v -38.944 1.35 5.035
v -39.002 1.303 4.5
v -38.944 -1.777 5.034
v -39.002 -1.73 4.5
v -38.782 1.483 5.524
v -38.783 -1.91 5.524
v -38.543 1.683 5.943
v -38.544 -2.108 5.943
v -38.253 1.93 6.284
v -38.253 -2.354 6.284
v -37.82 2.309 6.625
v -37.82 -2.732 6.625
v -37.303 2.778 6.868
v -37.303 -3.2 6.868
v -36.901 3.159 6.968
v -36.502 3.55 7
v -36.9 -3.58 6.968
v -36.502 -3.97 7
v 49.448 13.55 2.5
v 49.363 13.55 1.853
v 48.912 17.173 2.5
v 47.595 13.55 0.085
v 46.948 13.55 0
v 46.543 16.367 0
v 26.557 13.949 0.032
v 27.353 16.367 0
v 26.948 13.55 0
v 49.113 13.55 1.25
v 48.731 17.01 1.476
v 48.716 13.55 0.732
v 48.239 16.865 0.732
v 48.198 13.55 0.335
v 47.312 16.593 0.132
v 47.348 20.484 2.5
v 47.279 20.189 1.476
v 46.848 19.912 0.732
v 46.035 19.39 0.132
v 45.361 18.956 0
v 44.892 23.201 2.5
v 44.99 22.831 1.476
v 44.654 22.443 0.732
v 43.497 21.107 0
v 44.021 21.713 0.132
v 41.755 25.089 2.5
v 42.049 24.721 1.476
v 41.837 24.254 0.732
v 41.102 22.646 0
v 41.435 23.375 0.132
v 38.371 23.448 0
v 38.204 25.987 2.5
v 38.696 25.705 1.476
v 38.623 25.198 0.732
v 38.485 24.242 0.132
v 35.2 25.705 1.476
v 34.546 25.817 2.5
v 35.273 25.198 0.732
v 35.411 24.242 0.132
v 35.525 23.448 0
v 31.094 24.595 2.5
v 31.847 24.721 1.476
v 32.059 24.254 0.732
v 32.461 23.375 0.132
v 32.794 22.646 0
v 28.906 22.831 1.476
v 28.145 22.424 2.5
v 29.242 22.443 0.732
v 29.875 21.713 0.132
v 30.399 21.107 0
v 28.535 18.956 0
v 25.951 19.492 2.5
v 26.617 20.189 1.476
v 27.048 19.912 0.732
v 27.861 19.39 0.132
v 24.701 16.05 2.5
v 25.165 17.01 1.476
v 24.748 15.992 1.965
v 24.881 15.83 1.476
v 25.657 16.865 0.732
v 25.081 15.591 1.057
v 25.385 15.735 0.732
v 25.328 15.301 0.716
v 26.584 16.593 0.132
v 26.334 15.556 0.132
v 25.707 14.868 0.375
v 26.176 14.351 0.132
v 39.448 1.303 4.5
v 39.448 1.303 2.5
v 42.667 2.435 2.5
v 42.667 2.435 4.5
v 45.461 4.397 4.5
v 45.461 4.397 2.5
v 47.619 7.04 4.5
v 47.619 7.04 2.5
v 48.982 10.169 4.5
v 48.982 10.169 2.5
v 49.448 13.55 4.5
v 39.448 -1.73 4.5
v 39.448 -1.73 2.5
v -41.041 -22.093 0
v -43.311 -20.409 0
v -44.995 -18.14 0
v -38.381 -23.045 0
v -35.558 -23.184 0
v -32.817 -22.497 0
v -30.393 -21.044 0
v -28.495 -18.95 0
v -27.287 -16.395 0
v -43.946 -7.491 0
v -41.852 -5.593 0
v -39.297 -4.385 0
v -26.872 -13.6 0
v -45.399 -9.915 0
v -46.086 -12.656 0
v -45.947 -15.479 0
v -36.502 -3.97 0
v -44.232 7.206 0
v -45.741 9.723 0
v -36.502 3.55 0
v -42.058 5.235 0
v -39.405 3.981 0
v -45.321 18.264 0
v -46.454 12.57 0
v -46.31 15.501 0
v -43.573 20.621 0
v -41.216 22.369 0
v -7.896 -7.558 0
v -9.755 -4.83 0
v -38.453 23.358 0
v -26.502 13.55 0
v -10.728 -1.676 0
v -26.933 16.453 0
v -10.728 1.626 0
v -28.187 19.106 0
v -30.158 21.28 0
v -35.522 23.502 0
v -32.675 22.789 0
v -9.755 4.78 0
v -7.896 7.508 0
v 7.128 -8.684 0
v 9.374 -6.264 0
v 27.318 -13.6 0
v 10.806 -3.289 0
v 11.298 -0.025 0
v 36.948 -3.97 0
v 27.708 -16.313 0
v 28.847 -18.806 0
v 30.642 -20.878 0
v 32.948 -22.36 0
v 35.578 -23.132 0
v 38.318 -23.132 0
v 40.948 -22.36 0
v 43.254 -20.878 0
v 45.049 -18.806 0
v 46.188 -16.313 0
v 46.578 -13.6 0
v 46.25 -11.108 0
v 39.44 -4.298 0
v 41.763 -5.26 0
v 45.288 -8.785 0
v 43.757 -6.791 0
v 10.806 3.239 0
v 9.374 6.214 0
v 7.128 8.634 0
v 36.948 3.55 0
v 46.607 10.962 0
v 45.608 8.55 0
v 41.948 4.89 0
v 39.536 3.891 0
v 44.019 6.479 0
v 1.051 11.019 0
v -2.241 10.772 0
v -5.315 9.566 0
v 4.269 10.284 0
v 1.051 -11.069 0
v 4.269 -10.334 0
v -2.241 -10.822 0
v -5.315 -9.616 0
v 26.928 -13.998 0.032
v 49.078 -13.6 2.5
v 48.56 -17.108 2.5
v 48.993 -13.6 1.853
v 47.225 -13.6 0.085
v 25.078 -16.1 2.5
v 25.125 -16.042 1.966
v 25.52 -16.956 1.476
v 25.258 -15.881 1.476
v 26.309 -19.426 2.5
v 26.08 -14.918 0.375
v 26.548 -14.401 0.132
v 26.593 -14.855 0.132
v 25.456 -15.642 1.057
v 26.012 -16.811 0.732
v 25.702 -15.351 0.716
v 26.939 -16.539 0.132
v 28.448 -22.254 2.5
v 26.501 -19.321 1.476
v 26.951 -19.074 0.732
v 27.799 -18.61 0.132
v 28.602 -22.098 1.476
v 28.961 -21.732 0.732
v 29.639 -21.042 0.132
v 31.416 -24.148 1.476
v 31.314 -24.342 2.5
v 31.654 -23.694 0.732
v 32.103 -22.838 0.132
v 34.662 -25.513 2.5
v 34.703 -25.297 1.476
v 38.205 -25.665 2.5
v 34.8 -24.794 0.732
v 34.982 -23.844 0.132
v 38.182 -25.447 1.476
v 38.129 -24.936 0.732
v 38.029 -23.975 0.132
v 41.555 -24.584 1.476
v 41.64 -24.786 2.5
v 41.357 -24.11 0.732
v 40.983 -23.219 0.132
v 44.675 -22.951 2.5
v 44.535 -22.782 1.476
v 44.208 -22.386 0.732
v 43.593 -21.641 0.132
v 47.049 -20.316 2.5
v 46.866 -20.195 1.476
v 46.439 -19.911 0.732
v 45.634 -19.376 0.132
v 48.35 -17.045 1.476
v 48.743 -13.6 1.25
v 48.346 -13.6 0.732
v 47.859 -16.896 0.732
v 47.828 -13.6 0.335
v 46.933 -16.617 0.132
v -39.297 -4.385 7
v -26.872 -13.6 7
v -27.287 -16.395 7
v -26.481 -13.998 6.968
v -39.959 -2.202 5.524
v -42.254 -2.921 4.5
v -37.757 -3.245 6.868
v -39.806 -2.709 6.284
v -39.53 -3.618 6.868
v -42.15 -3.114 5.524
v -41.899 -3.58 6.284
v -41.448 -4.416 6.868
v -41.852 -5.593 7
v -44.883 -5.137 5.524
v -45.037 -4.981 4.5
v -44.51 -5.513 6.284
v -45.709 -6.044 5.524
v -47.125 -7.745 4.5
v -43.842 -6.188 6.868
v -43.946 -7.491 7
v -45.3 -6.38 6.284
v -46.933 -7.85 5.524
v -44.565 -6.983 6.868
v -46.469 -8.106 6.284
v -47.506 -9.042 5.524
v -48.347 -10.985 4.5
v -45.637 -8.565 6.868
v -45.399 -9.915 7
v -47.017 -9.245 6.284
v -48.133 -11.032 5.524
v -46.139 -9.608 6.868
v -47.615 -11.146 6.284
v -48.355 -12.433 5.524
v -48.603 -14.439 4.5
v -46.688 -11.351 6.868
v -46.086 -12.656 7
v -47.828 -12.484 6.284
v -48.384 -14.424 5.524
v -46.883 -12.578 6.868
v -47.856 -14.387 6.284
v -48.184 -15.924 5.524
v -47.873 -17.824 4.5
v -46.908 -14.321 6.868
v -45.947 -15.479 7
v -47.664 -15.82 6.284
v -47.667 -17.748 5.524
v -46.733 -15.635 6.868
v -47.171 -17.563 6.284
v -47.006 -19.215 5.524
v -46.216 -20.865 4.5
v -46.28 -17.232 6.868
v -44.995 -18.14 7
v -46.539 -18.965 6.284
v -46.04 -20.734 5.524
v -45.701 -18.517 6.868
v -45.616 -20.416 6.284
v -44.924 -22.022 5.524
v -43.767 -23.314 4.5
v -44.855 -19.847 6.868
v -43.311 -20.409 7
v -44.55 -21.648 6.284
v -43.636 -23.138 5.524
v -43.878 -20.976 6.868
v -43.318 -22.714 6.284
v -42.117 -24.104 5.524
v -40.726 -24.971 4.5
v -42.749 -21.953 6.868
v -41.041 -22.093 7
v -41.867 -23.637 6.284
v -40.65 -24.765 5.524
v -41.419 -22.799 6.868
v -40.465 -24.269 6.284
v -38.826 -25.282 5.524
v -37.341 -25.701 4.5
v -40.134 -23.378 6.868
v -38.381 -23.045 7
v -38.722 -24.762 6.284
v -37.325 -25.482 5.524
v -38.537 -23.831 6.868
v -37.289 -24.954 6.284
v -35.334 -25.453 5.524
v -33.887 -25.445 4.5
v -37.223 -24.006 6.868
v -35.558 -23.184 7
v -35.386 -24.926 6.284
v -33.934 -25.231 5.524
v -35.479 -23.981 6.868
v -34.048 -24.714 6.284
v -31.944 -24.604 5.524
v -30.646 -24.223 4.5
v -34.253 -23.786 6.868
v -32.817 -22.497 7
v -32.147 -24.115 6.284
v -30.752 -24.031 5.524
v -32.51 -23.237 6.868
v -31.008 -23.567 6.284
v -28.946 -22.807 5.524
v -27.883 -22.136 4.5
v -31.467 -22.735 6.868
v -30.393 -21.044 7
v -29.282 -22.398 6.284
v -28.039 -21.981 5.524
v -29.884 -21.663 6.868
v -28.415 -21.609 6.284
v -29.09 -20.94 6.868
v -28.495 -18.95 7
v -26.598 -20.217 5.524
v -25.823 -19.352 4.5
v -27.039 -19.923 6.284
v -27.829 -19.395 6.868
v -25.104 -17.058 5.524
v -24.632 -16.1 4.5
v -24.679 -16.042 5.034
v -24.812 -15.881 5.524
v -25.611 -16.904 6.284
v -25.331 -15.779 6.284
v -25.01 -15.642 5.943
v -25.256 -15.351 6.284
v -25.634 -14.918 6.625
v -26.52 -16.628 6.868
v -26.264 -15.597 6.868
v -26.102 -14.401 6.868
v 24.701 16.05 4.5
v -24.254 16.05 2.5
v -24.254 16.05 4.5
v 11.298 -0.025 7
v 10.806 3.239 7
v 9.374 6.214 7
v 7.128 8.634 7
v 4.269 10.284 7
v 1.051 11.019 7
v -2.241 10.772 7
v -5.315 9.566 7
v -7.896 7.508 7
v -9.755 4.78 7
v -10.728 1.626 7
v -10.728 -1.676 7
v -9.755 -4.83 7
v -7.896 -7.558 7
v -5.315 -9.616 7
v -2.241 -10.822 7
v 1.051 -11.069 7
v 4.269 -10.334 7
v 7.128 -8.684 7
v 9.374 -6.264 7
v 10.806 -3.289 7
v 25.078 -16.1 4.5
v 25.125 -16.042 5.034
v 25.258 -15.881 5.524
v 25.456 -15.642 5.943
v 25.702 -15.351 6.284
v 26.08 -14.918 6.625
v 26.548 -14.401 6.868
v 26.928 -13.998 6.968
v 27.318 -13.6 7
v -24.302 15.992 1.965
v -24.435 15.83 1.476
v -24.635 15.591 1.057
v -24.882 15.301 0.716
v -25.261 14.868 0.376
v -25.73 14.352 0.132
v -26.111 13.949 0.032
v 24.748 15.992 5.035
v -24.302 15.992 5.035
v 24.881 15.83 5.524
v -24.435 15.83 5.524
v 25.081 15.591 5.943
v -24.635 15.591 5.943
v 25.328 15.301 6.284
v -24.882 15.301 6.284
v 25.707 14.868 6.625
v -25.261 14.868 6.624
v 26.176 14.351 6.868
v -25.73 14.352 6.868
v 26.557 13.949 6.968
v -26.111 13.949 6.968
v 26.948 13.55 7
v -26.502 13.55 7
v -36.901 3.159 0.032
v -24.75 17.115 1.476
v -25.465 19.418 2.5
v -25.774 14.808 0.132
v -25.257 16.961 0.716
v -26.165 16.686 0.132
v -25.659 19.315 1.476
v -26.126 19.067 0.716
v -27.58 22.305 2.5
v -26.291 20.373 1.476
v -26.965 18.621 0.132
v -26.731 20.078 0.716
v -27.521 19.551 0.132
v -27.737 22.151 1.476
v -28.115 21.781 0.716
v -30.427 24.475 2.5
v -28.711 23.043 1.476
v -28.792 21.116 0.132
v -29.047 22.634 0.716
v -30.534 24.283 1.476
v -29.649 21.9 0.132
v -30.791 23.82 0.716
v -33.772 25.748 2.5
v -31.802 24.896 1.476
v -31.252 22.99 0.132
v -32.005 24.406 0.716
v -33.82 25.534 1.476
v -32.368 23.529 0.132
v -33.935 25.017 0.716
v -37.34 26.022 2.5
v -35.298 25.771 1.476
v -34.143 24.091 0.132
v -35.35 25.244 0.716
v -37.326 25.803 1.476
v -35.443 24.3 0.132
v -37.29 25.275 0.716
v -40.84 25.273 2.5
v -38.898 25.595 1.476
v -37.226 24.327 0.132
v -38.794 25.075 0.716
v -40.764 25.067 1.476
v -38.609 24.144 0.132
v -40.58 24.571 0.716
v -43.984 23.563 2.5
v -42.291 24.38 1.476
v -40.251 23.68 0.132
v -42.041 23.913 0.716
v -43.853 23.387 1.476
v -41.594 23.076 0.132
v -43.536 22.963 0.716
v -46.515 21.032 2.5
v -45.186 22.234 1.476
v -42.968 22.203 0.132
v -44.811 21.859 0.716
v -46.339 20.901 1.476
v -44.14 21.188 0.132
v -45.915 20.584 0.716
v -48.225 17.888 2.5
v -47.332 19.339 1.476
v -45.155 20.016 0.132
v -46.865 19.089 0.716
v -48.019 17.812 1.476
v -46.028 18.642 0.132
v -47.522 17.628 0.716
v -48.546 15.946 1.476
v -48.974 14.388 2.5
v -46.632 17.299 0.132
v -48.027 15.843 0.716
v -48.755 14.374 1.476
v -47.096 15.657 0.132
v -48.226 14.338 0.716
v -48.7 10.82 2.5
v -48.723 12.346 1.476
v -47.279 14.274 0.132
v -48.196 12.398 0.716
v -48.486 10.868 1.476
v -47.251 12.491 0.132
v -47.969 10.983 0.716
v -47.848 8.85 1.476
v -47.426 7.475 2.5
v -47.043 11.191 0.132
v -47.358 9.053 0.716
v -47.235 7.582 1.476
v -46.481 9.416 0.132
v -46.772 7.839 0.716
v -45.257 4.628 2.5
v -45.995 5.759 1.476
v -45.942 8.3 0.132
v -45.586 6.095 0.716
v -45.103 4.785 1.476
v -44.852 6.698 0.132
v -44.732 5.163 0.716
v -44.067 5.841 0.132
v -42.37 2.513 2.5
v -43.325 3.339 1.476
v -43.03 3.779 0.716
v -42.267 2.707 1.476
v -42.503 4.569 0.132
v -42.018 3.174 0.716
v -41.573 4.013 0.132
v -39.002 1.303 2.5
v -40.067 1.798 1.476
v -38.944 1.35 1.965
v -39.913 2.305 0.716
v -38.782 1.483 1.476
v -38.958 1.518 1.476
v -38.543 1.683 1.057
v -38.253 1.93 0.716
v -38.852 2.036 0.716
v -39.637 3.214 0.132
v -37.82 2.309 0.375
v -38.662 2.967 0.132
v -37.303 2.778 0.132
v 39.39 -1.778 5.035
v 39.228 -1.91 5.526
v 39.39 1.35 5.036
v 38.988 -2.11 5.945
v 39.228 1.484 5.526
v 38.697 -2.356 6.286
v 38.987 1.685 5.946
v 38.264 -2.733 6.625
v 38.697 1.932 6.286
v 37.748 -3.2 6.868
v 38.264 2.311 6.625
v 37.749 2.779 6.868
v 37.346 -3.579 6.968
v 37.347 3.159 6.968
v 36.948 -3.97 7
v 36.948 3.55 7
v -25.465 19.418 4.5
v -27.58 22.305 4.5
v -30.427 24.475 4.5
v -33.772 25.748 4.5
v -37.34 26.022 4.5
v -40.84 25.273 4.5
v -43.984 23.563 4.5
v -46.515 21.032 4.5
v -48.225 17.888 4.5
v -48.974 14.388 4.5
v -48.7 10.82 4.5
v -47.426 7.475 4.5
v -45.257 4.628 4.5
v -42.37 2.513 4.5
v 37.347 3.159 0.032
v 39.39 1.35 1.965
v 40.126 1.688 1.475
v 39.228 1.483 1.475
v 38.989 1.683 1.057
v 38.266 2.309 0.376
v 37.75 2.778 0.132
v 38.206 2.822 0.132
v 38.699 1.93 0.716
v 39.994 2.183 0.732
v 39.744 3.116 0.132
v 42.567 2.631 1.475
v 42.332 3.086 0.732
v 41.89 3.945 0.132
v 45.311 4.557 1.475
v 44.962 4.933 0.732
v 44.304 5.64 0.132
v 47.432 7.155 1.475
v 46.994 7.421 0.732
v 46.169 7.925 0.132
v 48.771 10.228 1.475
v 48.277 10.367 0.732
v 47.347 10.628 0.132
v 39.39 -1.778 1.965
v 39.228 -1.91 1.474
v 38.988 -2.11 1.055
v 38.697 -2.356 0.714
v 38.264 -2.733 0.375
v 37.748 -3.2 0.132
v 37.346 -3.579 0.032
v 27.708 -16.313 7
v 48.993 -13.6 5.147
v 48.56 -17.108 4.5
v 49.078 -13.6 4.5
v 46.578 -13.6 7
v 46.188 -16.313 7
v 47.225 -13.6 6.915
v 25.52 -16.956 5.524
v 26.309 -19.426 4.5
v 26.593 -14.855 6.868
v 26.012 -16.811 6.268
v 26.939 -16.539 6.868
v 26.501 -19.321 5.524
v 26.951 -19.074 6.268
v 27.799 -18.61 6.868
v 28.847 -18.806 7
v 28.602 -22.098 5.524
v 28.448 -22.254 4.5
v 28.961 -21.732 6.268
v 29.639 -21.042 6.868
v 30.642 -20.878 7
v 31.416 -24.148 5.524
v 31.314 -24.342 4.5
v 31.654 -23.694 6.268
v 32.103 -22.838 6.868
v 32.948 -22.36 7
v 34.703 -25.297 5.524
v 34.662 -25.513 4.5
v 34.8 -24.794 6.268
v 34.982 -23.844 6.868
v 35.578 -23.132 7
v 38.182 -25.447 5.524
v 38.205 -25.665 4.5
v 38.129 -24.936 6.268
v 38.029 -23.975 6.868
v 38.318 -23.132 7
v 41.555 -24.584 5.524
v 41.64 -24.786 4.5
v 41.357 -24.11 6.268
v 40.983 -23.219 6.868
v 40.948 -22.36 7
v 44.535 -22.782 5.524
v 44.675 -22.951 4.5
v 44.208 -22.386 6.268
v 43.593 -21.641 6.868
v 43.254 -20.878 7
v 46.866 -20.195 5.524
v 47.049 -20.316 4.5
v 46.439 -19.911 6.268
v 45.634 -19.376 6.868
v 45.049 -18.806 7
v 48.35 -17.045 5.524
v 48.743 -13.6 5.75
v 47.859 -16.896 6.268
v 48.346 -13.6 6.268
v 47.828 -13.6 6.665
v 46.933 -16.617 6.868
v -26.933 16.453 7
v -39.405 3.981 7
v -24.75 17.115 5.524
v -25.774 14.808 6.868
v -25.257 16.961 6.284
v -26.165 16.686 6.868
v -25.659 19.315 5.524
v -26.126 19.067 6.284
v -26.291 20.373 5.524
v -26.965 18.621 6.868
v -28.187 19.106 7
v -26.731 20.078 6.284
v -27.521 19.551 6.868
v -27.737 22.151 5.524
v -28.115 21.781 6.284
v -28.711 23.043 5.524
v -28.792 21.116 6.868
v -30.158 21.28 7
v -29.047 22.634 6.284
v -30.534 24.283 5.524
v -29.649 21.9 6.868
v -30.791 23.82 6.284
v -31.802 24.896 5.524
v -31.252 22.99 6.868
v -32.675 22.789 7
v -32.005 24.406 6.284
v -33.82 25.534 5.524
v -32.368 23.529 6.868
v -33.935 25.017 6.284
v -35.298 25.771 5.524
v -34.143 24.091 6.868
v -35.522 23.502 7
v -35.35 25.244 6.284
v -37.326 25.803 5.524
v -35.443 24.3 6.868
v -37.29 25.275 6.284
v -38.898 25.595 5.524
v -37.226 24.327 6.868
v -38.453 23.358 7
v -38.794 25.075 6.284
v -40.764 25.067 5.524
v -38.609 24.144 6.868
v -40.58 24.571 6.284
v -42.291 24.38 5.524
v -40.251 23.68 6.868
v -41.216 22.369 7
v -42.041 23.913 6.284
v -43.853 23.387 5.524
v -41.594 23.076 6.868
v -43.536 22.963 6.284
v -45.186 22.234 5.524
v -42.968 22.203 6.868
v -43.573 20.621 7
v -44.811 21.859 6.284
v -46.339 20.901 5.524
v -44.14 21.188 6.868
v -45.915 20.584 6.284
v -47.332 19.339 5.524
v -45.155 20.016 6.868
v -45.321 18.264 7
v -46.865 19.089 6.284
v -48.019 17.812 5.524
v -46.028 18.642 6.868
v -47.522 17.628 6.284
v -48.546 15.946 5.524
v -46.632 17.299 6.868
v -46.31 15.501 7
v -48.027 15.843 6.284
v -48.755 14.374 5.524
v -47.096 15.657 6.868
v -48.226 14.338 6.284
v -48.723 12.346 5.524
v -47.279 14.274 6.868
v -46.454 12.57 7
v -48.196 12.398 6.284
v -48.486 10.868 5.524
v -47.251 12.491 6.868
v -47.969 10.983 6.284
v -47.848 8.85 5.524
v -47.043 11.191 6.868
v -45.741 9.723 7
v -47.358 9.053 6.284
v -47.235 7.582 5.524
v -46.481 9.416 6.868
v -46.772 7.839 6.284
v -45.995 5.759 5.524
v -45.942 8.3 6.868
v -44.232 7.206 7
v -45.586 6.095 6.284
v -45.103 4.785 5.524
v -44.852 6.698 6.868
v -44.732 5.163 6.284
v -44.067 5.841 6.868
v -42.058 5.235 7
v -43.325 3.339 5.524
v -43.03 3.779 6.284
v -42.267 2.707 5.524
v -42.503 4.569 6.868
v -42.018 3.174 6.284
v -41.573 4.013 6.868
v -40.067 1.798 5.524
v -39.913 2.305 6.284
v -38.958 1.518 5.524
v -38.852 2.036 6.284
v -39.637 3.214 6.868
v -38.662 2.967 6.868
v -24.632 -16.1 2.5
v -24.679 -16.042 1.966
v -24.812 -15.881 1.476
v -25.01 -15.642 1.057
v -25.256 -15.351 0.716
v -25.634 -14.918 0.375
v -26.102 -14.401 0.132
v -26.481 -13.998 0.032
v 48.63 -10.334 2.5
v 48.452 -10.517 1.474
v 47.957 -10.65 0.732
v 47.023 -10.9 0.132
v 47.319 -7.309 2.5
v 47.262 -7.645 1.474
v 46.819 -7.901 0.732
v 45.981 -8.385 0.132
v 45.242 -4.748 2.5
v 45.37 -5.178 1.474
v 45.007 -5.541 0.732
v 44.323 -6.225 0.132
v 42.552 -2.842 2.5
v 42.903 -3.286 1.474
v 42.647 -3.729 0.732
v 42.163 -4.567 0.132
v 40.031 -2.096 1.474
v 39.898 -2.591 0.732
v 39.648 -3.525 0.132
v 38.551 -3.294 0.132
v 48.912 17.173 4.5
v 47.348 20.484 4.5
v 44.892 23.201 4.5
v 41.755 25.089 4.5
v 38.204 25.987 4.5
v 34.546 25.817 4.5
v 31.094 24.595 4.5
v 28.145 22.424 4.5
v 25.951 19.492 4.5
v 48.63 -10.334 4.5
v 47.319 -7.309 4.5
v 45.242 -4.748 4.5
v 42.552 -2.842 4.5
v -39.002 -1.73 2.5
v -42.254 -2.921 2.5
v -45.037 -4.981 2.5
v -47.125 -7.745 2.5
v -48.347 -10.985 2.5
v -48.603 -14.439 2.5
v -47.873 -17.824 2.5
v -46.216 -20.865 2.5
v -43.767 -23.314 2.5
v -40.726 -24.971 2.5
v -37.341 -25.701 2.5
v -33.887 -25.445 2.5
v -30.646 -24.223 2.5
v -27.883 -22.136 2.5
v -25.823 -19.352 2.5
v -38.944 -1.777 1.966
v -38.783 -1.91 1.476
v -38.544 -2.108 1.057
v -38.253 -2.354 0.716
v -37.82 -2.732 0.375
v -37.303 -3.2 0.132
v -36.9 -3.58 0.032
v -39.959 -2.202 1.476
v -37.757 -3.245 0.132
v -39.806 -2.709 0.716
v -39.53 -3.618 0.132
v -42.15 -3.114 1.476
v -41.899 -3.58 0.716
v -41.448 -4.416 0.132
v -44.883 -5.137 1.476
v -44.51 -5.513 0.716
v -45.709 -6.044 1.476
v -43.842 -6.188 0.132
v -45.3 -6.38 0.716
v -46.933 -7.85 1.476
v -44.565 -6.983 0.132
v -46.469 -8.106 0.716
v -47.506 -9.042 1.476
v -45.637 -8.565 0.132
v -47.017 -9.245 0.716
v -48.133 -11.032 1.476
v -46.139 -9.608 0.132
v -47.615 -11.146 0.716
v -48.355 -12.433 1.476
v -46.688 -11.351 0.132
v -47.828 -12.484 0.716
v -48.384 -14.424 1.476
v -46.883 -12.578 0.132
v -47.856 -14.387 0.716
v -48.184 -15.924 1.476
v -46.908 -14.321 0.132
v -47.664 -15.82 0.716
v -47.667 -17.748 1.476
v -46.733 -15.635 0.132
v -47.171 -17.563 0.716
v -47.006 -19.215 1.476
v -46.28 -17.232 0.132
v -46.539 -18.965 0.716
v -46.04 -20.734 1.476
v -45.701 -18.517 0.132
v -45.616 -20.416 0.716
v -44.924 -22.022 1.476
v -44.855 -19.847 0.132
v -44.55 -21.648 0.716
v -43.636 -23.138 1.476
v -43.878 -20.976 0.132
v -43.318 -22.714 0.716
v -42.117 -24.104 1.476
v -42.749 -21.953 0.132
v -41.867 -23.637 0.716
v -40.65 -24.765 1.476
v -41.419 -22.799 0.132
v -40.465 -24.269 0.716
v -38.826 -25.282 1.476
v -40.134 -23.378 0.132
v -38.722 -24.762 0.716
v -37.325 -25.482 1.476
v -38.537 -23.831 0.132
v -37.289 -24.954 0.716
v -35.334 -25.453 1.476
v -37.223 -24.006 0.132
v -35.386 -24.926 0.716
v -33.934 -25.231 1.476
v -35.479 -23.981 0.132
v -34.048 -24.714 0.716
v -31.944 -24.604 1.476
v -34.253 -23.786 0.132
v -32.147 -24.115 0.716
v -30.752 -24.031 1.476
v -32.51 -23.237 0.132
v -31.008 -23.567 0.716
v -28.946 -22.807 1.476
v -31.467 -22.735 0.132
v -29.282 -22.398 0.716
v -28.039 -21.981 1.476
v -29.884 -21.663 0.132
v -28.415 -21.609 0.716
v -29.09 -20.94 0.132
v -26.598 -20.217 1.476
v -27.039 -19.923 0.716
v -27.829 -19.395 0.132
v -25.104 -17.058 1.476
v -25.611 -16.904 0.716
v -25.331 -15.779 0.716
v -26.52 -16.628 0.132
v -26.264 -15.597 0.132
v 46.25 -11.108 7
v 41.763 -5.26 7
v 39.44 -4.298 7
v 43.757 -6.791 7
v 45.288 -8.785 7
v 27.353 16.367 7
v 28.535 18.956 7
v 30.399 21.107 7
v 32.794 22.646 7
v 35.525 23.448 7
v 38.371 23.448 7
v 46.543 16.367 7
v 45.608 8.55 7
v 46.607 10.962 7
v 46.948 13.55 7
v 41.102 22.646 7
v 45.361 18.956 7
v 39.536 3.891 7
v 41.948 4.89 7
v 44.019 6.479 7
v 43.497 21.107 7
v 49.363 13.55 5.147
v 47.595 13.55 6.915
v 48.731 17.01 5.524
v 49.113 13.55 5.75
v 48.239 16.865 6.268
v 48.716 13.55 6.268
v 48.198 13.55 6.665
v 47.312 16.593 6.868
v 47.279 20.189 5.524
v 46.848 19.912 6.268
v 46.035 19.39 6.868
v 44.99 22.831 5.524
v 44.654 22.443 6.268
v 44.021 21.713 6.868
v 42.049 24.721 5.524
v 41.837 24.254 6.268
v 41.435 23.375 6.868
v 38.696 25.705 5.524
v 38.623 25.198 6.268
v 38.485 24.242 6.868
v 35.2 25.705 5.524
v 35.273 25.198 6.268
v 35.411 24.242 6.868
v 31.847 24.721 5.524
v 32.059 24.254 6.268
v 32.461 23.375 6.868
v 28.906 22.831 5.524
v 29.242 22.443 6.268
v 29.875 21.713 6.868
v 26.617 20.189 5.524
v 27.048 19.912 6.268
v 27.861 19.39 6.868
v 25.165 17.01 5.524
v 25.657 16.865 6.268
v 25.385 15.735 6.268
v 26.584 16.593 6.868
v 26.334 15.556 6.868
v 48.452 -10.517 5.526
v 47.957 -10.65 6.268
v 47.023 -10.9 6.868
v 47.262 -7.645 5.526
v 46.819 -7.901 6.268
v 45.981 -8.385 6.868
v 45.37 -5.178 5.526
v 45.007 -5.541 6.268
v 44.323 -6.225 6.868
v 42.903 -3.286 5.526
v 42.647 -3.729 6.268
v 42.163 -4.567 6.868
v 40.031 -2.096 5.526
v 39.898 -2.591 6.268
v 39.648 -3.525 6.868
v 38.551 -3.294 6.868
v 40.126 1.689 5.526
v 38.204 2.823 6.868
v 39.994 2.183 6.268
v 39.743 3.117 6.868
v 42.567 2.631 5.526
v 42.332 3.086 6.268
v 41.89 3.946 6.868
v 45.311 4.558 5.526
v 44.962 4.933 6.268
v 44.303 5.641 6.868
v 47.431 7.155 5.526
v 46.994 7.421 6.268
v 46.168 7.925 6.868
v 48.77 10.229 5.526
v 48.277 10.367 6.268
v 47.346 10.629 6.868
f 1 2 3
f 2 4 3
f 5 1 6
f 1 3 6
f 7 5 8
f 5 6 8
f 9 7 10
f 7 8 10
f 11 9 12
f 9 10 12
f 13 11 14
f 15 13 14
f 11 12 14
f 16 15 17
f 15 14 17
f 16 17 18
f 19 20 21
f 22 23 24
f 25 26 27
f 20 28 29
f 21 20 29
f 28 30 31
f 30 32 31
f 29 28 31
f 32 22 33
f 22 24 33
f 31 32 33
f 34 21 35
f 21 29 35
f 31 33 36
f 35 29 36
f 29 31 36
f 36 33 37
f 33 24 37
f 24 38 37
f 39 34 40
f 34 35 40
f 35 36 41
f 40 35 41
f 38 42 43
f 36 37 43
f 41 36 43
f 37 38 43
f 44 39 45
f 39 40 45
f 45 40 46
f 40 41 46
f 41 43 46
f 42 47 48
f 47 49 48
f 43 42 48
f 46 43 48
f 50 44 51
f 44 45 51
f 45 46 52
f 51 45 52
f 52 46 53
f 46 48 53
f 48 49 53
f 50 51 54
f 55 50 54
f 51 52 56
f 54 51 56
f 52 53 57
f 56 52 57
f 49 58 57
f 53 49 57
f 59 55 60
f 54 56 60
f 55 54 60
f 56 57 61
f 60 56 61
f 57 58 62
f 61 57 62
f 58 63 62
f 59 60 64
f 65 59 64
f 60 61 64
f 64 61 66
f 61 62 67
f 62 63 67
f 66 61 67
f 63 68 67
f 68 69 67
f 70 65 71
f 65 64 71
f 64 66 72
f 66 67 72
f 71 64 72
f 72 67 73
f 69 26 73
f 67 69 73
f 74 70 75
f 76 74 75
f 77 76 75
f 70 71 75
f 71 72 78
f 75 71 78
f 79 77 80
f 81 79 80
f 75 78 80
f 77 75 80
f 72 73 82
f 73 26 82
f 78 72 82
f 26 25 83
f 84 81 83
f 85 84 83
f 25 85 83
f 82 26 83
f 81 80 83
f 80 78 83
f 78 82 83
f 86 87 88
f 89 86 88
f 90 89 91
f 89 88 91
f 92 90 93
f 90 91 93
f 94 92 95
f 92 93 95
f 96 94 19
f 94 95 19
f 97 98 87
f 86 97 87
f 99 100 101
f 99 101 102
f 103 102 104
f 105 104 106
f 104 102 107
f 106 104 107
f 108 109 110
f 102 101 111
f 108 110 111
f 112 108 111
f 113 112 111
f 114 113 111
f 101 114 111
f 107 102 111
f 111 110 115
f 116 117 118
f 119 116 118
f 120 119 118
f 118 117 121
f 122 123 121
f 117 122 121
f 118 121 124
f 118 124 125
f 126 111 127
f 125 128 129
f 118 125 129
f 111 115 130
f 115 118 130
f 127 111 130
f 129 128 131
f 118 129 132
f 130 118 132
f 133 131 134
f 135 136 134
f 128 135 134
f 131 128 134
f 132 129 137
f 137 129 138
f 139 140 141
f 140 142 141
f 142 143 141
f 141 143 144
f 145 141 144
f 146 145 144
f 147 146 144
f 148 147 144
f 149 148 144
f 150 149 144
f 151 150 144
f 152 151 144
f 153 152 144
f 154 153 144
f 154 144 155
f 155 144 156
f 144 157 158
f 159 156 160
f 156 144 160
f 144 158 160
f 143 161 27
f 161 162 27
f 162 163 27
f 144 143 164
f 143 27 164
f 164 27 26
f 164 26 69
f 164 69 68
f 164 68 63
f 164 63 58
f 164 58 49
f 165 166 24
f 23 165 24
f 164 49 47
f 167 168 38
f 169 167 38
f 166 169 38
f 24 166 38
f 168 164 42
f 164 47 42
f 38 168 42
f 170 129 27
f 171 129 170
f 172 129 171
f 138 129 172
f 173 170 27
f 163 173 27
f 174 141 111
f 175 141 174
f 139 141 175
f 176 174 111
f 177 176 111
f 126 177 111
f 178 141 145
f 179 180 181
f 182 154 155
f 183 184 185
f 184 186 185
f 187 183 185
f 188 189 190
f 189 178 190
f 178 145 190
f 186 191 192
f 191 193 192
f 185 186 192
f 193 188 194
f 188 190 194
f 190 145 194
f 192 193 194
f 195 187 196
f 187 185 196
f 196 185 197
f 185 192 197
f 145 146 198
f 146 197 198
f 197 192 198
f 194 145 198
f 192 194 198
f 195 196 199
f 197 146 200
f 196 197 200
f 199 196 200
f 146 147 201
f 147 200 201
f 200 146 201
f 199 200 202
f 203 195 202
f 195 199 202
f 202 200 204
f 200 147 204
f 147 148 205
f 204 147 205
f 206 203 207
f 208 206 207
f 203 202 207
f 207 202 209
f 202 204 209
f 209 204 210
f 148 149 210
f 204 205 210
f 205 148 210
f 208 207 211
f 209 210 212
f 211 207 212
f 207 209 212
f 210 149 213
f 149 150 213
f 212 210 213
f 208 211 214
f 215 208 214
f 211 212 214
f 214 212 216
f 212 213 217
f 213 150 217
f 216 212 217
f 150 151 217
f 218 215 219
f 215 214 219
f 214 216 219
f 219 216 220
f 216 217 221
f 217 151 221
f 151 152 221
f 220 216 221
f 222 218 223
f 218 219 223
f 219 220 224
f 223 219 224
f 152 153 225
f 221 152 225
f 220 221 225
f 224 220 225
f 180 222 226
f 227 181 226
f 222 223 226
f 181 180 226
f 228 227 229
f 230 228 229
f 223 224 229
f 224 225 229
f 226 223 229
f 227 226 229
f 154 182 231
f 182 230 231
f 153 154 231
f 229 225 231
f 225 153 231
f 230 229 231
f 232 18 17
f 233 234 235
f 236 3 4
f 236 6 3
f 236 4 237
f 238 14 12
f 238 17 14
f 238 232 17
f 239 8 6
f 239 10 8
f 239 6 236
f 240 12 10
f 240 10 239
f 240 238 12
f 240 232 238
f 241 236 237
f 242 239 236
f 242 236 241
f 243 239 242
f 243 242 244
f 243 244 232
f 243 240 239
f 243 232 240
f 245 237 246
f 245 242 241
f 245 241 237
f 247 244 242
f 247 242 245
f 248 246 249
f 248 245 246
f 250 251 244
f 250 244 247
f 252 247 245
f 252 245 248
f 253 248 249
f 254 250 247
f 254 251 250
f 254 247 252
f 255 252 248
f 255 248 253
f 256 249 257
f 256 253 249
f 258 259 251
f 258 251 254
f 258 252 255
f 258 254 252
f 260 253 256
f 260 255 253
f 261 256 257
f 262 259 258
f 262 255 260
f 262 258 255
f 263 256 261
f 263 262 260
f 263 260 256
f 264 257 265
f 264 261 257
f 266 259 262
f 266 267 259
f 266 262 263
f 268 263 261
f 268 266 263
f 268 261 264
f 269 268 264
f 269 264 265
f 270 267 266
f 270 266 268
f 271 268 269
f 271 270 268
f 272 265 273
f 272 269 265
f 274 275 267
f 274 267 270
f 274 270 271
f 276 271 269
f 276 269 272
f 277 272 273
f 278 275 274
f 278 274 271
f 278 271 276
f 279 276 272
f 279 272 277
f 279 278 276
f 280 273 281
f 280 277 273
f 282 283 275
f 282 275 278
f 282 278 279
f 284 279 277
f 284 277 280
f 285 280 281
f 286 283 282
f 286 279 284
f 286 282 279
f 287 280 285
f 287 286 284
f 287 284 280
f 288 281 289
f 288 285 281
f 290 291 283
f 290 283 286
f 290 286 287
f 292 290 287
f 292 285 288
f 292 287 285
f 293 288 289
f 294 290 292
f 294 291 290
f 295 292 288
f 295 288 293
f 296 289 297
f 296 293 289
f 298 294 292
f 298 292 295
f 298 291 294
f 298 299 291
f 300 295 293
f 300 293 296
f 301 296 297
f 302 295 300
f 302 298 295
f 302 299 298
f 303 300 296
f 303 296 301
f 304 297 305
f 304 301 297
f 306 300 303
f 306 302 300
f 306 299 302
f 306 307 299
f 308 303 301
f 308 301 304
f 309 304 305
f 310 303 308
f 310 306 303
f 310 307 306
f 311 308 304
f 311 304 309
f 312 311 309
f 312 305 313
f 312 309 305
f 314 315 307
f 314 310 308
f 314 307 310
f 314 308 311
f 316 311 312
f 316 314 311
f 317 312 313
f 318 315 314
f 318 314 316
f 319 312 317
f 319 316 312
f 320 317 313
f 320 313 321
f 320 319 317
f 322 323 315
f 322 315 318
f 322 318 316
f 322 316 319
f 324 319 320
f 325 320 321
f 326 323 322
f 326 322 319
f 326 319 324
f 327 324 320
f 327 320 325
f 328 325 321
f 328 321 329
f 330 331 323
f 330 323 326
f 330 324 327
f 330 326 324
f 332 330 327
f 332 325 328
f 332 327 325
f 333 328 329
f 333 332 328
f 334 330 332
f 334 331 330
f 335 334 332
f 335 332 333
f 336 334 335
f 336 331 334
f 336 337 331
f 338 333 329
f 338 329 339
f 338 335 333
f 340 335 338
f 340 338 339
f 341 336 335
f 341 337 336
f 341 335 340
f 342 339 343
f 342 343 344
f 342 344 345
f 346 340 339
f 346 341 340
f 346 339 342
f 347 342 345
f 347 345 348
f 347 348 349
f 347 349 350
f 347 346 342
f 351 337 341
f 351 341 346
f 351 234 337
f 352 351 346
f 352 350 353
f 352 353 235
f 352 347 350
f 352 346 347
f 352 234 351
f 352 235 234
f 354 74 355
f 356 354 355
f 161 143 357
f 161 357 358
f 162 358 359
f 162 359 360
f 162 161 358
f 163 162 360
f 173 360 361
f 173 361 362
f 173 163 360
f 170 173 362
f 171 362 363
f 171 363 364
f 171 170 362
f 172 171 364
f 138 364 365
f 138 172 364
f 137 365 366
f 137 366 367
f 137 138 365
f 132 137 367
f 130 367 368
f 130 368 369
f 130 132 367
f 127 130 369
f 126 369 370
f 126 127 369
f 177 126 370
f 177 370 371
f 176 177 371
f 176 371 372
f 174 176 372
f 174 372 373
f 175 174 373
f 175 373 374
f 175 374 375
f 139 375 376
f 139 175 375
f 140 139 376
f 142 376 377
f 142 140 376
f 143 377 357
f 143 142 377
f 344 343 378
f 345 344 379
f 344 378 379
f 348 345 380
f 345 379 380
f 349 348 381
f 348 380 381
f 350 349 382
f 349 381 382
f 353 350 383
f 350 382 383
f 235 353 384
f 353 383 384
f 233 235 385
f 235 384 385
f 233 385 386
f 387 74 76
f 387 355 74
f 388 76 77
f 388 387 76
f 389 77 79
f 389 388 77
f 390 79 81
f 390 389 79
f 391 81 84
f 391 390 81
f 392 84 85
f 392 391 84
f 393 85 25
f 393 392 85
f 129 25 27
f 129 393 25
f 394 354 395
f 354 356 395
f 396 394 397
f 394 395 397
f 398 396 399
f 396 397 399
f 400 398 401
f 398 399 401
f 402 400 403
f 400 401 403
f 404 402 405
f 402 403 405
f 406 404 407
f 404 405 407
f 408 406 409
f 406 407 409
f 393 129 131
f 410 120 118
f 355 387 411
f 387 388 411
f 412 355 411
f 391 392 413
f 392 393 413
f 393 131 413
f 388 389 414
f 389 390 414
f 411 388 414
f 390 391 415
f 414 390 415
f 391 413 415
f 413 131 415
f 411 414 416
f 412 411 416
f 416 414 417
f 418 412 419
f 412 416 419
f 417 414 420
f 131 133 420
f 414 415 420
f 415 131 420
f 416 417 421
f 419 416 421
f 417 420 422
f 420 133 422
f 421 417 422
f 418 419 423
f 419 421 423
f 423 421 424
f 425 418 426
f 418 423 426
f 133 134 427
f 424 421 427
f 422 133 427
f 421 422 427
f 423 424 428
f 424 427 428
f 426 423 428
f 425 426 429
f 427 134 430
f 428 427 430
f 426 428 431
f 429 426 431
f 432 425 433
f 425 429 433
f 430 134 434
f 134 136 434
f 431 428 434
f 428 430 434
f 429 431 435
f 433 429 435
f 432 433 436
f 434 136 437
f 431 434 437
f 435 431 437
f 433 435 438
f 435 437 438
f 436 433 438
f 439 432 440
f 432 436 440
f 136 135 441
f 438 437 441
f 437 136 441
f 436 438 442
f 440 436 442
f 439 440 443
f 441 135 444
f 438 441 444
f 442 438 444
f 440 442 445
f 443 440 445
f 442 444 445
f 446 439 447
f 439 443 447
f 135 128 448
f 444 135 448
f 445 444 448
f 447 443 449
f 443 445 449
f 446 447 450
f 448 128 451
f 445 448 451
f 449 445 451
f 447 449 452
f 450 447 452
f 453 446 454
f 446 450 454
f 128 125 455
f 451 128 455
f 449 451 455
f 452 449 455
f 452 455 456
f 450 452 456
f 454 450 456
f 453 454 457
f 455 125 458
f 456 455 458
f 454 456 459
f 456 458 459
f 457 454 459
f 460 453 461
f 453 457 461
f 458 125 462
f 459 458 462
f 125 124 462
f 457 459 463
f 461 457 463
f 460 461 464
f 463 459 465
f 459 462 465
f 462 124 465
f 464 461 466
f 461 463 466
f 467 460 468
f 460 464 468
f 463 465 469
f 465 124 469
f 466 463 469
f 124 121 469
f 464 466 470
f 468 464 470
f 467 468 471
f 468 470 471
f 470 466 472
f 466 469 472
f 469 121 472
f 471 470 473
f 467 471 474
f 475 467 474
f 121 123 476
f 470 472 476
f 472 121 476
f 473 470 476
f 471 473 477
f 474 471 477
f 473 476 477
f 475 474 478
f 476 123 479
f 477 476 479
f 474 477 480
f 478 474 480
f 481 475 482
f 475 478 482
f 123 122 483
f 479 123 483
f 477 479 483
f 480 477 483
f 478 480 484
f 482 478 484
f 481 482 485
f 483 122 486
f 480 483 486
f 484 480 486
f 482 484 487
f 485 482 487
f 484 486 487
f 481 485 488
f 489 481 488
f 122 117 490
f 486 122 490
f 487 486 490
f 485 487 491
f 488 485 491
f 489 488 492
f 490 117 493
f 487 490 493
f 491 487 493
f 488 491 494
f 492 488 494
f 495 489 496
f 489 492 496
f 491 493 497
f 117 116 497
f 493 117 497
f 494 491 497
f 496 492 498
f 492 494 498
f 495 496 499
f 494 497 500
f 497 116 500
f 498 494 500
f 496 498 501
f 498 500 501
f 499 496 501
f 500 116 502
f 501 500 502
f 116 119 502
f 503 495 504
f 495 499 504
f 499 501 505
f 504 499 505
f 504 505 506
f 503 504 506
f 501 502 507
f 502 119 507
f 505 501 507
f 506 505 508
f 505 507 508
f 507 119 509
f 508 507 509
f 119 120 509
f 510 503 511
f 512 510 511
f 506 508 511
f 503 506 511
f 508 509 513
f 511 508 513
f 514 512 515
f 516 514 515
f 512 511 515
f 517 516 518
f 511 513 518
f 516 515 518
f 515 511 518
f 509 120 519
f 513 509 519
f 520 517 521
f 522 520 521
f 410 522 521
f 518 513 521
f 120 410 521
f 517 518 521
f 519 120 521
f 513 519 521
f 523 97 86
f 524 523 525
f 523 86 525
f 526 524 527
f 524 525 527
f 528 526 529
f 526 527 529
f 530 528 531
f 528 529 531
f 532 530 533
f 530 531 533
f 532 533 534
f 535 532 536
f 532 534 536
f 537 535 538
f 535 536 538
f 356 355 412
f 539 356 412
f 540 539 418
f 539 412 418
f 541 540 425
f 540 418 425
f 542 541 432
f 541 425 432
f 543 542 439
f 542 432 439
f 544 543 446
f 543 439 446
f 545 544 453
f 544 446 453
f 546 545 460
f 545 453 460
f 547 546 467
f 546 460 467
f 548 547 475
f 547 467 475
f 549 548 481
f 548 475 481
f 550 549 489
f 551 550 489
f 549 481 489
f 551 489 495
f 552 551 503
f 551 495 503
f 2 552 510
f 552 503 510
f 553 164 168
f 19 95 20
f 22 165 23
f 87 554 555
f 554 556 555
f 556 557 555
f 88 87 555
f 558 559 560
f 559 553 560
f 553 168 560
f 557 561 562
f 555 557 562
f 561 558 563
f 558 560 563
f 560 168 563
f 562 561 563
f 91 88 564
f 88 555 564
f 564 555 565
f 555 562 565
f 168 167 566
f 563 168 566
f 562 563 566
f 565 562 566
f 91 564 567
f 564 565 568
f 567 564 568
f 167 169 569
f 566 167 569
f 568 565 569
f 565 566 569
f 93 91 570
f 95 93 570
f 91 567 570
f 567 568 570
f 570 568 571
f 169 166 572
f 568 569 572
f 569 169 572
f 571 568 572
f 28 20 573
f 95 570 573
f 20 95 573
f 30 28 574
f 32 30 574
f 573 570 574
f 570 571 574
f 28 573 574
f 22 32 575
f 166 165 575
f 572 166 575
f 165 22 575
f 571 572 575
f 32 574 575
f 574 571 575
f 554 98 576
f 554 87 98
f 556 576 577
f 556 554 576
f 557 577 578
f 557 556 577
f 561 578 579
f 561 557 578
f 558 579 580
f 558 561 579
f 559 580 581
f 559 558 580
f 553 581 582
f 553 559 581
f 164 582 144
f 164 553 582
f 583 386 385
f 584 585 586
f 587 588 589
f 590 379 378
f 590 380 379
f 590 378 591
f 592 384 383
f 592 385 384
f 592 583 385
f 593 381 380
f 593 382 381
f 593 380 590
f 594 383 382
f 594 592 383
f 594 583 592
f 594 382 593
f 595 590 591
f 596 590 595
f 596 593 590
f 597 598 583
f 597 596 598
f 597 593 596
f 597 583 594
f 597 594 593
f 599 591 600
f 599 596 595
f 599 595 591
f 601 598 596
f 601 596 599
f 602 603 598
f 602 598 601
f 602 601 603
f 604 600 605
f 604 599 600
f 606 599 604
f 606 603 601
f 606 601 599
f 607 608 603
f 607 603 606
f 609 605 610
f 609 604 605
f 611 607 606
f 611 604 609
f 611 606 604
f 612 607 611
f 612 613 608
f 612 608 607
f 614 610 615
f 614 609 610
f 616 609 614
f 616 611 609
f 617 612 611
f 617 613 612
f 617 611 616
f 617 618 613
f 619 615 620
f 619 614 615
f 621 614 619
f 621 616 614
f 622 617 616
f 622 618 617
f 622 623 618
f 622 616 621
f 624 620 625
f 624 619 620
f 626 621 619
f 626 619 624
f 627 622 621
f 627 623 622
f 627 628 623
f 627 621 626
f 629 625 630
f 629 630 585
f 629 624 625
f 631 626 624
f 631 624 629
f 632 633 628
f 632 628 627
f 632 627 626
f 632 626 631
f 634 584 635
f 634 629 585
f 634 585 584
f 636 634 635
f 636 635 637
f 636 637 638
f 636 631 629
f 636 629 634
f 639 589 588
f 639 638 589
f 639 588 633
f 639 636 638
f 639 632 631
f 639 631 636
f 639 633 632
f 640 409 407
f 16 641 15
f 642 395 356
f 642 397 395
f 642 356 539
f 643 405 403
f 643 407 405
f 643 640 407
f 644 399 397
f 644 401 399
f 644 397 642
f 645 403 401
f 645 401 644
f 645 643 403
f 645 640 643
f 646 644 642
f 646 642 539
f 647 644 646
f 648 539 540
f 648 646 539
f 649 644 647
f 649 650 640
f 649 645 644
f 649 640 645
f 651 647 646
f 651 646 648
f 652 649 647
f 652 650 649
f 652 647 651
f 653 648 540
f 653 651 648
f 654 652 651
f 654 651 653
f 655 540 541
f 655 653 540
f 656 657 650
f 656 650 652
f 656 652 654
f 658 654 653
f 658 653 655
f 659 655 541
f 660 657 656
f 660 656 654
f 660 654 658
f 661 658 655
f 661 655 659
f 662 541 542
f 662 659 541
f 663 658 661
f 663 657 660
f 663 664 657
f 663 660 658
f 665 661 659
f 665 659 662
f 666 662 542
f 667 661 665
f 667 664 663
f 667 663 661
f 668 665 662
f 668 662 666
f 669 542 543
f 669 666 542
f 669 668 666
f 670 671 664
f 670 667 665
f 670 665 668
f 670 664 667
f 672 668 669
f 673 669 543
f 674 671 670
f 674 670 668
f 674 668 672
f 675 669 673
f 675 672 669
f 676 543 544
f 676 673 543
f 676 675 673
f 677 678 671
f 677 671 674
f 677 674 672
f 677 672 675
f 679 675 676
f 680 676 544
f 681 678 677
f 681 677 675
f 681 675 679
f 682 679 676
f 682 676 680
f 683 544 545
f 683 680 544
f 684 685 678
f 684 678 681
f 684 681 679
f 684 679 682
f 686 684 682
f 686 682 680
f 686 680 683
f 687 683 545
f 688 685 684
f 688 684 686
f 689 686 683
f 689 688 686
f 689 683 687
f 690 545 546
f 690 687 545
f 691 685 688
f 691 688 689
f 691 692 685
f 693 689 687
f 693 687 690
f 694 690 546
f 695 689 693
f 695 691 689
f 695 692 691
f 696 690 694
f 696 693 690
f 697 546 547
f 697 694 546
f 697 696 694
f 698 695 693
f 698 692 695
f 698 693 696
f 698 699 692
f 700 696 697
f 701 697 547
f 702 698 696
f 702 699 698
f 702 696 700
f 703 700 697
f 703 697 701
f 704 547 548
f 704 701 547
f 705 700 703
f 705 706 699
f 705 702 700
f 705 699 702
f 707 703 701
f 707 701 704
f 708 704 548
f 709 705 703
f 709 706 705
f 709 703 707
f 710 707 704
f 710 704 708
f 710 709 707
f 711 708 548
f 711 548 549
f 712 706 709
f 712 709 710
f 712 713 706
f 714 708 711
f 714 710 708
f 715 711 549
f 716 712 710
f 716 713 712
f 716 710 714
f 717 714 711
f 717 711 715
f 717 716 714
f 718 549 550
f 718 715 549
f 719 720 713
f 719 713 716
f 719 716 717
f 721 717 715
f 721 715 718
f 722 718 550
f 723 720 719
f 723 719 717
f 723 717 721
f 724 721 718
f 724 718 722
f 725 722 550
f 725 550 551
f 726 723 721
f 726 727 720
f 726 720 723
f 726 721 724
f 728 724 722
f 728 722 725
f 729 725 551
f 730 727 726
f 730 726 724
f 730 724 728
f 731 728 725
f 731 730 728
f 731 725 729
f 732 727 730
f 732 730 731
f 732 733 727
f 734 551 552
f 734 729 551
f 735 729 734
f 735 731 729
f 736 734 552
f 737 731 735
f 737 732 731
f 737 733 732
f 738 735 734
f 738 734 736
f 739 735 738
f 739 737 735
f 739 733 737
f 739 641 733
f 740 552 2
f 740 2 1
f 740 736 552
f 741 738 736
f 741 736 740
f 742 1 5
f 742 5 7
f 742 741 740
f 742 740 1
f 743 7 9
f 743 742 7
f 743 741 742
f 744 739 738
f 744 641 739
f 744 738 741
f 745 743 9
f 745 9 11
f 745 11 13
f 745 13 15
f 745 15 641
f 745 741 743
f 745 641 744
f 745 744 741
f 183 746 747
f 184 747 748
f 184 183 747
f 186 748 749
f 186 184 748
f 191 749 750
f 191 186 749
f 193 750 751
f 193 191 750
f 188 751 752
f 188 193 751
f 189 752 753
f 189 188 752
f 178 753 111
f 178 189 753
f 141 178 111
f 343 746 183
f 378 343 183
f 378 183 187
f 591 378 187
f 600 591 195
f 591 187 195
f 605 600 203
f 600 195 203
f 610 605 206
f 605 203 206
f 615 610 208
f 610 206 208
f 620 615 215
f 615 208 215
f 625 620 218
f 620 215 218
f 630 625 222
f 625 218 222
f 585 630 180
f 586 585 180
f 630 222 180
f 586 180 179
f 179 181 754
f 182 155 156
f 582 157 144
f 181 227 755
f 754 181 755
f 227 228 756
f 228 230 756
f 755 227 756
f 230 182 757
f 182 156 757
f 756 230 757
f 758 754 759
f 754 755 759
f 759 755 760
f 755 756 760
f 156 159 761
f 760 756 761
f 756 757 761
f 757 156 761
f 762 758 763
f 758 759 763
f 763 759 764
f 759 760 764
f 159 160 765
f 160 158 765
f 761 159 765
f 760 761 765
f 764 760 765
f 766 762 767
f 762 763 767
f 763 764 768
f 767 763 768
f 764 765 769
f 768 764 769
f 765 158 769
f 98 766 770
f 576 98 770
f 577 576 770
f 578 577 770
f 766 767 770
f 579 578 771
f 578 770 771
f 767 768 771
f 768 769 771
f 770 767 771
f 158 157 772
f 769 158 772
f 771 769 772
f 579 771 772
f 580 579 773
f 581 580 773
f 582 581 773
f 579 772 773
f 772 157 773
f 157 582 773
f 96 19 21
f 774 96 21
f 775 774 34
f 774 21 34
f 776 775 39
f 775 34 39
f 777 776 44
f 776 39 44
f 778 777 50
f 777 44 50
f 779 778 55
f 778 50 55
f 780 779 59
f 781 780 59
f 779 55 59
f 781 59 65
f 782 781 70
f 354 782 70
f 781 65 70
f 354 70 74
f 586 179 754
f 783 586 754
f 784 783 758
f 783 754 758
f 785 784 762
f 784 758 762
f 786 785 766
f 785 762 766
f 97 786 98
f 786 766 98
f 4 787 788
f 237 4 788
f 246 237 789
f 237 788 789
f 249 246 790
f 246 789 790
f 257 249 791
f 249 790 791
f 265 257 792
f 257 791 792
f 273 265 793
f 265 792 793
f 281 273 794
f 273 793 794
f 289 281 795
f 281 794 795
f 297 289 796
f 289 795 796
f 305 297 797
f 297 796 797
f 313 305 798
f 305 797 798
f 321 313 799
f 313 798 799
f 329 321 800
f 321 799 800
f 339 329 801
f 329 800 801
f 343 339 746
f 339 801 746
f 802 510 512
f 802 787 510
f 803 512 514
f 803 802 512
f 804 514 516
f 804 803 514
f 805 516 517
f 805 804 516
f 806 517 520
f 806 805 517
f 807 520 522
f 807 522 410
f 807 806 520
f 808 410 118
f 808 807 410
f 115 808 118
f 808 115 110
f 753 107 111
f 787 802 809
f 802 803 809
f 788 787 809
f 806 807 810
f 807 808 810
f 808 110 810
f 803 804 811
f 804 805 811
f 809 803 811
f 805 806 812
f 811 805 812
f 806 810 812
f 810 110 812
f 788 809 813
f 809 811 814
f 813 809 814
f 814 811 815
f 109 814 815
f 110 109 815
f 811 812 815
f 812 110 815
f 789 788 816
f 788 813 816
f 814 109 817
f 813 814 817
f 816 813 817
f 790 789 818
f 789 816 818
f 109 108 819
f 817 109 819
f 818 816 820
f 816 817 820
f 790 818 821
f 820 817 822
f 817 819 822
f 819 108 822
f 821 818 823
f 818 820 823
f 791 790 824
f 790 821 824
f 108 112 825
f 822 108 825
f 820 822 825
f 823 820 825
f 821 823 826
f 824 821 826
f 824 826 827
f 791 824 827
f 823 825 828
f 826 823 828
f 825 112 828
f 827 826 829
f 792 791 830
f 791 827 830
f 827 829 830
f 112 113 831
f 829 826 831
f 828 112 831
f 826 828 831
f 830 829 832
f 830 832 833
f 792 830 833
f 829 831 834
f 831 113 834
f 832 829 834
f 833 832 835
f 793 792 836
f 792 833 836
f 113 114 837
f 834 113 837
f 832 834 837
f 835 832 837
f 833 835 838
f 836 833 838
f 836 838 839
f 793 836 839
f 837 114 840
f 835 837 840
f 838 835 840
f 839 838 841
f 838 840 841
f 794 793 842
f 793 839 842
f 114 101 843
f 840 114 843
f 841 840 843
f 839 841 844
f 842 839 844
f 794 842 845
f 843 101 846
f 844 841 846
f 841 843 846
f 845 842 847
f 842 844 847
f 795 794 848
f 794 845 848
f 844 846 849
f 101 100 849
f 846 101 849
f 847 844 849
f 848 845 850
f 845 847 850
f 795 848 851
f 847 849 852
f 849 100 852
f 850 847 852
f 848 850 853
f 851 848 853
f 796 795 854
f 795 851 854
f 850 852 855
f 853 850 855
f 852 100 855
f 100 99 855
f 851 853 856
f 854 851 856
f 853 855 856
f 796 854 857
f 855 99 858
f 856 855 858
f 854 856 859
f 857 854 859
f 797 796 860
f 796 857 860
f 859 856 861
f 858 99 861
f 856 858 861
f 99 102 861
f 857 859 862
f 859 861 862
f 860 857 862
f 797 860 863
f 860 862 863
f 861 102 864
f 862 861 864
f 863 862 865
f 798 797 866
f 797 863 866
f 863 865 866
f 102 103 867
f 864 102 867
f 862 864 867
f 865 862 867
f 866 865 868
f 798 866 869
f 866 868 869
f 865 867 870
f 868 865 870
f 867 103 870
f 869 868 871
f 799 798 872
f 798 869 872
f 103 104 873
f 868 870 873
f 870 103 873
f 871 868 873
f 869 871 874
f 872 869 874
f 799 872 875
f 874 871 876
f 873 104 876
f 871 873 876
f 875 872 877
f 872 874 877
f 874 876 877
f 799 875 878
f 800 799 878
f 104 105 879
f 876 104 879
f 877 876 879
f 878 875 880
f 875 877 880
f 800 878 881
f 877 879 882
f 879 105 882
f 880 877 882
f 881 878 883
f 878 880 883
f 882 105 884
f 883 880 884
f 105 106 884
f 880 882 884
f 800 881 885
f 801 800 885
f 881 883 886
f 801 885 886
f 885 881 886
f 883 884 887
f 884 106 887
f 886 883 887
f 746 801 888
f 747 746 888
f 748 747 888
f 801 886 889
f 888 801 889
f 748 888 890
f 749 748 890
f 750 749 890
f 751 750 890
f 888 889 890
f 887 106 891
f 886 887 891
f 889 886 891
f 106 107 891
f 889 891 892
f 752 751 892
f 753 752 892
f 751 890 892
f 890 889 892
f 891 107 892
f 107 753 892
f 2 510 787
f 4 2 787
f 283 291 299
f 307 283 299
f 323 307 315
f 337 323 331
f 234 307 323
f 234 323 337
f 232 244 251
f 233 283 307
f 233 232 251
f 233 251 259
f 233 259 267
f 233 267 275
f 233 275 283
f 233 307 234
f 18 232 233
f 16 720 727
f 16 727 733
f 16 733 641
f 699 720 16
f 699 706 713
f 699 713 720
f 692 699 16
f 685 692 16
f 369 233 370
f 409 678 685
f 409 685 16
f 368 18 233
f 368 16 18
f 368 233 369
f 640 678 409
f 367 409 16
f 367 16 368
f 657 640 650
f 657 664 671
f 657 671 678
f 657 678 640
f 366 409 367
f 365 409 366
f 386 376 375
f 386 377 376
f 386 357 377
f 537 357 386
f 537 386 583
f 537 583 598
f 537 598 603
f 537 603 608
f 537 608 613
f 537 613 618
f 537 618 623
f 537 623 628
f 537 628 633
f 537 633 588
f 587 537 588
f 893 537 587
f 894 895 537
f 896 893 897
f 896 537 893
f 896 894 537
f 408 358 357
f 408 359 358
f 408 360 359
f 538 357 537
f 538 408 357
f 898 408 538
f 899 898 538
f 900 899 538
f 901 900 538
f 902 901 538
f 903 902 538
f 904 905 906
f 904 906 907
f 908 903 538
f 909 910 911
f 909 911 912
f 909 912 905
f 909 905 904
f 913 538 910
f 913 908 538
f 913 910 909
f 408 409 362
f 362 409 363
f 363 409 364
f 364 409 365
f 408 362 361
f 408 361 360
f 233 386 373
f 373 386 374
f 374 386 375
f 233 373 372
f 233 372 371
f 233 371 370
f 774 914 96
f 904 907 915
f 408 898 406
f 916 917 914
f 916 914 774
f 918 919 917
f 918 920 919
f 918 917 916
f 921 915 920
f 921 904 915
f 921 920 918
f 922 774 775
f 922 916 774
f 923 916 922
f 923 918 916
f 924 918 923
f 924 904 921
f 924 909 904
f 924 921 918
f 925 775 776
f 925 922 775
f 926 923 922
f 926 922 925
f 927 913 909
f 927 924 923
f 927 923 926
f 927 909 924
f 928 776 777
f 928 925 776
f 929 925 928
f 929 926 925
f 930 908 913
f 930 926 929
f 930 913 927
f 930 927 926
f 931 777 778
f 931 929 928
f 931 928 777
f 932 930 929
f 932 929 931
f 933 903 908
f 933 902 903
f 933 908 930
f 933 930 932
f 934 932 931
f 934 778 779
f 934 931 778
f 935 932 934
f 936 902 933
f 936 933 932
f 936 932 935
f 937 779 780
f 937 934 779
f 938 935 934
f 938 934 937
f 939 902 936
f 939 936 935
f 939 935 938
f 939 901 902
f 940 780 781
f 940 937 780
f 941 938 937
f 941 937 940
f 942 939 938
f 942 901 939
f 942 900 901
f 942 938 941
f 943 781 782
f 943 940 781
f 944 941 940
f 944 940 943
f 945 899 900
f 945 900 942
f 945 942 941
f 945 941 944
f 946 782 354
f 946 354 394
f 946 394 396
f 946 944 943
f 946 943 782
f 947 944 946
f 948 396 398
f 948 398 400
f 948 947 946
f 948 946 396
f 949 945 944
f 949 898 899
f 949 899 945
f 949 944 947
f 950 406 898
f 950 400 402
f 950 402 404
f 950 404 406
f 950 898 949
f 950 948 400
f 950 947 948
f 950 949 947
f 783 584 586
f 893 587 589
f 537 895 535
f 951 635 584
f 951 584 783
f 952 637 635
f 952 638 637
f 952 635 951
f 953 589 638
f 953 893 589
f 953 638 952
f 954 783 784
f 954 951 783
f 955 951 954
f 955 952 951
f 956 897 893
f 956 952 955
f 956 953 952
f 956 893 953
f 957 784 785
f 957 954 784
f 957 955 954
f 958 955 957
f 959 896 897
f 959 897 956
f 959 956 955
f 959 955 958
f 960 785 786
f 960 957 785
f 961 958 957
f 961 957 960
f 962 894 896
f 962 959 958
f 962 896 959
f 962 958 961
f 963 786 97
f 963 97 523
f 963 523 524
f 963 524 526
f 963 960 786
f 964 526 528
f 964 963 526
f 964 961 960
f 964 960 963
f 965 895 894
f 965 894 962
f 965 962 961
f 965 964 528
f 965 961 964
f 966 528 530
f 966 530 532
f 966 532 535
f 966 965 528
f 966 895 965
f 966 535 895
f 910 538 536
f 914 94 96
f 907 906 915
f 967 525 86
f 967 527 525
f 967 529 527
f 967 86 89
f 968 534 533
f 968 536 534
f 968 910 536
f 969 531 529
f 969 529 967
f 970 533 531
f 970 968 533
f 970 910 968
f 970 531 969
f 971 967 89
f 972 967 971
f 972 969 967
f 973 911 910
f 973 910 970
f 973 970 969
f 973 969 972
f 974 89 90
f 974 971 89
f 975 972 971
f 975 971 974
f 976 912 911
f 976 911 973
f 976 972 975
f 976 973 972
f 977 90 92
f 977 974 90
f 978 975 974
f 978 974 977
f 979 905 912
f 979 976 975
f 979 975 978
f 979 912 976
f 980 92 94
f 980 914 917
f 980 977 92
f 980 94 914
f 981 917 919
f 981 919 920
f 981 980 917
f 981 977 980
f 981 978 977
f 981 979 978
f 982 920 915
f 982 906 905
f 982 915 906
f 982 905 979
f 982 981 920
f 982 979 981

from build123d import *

# Parameters (mm, degrees)
F0_R     = 11.075
F1_DEPTH = 7
F2_R     = 2.5


with BuildPart() as f1:
    # F0 (on Top) → F1 (new body)
    with BuildSketch(Plane.XY):
        with BuildLine():
            ThreePointArc((-24.254456, 16.050001), (-45.340739, 22.388836), (-39.001904, 1.302553))
            Line((-39.001904, 1.302553), (-39.001904, 16.050001))
            Line((-39.001904, 16.050001), (-24.254456, 16.050001))
        make_face()
        with BuildLine():
            Line((-39.001904, 16.050001), (-39.001904, 1.302553))
            ThreePointArc((-39.001904, 1.302553), (-28.59621, 3.867543), (-24.001904, 13.550001))
            ThreePointArc((-24.001904, 13.550001), (-24.065203, 14.806363), (-24.254456, 16.050001))
            Line((-24.254456, 16.050001), (-39.001904, 16.050001))
        make_face()
        with BuildLine():
            Line((-24.632326, -16.099999), (25.078419, -16.099999))
            ThreePointArc((25.078419, -16.099999), (28.370793, -5.022793), (39.447998, -1.73042))
            Line((39.447998, -1.73042), (39.447998, 1.302553))
            ThreePointArc((39.447998, 1.302553), (28.109163, 4.711167), (24.700549, 16.050001))
            Line((24.700549, 16.050001), (-24.254456, 16.050001))
            ThreePointArc((-24.254456, 16.050001), (-24.065203, 14.806363), (-24.001904, 13.550001))
            ThreePointArc((-24.001904, 13.550001), (-28.59621, 3.867543), (-39.001904, 1.302553))
            Line((-39.001904, 1.302553), (-39.001904, -1.73042))
            ThreePointArc((-39.001904, -1.73042), (-28.859526, -4.180288), (-24.371904, -13.599999))
            ThreePointArc((-24.371904, -13.599999), (-24.437185, -14.856762), (-24.632326, -16.099999))
        make_face()
        with Locations((0.222998, -0.024999)):
            Circle(F0_R, mode=Mode.SUBTRACT)
        with BuildLine():
            ThreePointArc((24.700549, 16.050001), (28.109163, 4.711167), (39.447998, 1.302553))
            Line((39.447998, 1.302553), (39.447998, 16.050001))
            Line((39.447998, 16.050001), (24.700549, 16.050001))
        make_face()
        with BuildLine():
            Line((25.078419, -16.099999), (39.447998, -16.099999))
            Line((39.447998, -16.099999), (39.447998, -1.73042))
            ThreePointArc((39.447998, -1.73042), (28.370793, -5.022793), (25.078419, -16.099999))
        make_face()
        with BuildLine():
            Line((39.447998, 16.050001), (39.447998, 1.302553))
            ThreePointArc((39.447998, 1.302553), (46.630456, 5.644307), (49.447998, 13.550001))
            ThreePointArc((49.447998, 13.550001), (38.20436, 25.986703), (24.700549, 16.050001))
            Line((24.700549, 16.050001), (39.447998, 16.050001))
        make_face()
        with BuildLine():
            Line((39.447998, -1.73042), (39.447998, -16.099999))
            Line((39.447998, -16.099999), (25.078419, -16.099999))
            ThreePointArc((25.078419, -16.099999), (38.204762, -25.664718), (49.077998, -13.599999))
            ThreePointArc((49.077998, -13.599999), (46.367709, -5.95762), (39.447998, -1.73042))
        make_face()
        with BuildLine():
            ThreePointArc((-39.001904, -1.73042), (-45.07911, -22.177204), (-24.632326, -16.099999))
            Line((-24.632326, -16.099999), (-39.001904, -16.099999))
            Line((-39.001904, -16.099999), (-39.001904, -1.73042))
        make_face()
        with BuildLine():
            Line((-39.001904, -16.099999), (-24.632326, -16.099999))
            ThreePointArc((-24.632326, -16.099999), (-24.437185, -14.856762), (-24.371904, -13.599999))
            ThreePointArc((-24.371904, -13.599999), (-28.859526, -4.180288), (-39.001904, -1.73042))
            Line((-39.001904, -1.73042), (-39.001904, -16.099999))
        make_face()
    extrude(amount=F1_DEPTH)

    # F2
    f2_edges = [f1.edges().sort_by_distance(p)[0] for p in [
        (-45.340739, 22.388836, 7),
        (0.223047, 16.050001, 7),
        (45.786833, 22.388836, 7),
        (39.447998, -0.213934, 7),
        (45.525203, -22.177204, 7),
        (0.223047, -16.099999, 7),
        (-45.07911, -22.177204, 7),
        (-39.001904, -0.213934, 7),
        (-45.07911, -22.177204, 0),
        (0.223047, -16.099999, 0),
        (45.525203, -22.177204, 0),
        (39.447998, -0.213934, 0),
        (45.786833, 22.388836, 0),
        (0.223047, 16.050001, 0),
        (-45.340739, 22.388836, 0),
        (-39.001904, -0.213934, 0),
    ]]
    fillet(f2_edges, radius=F2_R)


solid = f1.part
